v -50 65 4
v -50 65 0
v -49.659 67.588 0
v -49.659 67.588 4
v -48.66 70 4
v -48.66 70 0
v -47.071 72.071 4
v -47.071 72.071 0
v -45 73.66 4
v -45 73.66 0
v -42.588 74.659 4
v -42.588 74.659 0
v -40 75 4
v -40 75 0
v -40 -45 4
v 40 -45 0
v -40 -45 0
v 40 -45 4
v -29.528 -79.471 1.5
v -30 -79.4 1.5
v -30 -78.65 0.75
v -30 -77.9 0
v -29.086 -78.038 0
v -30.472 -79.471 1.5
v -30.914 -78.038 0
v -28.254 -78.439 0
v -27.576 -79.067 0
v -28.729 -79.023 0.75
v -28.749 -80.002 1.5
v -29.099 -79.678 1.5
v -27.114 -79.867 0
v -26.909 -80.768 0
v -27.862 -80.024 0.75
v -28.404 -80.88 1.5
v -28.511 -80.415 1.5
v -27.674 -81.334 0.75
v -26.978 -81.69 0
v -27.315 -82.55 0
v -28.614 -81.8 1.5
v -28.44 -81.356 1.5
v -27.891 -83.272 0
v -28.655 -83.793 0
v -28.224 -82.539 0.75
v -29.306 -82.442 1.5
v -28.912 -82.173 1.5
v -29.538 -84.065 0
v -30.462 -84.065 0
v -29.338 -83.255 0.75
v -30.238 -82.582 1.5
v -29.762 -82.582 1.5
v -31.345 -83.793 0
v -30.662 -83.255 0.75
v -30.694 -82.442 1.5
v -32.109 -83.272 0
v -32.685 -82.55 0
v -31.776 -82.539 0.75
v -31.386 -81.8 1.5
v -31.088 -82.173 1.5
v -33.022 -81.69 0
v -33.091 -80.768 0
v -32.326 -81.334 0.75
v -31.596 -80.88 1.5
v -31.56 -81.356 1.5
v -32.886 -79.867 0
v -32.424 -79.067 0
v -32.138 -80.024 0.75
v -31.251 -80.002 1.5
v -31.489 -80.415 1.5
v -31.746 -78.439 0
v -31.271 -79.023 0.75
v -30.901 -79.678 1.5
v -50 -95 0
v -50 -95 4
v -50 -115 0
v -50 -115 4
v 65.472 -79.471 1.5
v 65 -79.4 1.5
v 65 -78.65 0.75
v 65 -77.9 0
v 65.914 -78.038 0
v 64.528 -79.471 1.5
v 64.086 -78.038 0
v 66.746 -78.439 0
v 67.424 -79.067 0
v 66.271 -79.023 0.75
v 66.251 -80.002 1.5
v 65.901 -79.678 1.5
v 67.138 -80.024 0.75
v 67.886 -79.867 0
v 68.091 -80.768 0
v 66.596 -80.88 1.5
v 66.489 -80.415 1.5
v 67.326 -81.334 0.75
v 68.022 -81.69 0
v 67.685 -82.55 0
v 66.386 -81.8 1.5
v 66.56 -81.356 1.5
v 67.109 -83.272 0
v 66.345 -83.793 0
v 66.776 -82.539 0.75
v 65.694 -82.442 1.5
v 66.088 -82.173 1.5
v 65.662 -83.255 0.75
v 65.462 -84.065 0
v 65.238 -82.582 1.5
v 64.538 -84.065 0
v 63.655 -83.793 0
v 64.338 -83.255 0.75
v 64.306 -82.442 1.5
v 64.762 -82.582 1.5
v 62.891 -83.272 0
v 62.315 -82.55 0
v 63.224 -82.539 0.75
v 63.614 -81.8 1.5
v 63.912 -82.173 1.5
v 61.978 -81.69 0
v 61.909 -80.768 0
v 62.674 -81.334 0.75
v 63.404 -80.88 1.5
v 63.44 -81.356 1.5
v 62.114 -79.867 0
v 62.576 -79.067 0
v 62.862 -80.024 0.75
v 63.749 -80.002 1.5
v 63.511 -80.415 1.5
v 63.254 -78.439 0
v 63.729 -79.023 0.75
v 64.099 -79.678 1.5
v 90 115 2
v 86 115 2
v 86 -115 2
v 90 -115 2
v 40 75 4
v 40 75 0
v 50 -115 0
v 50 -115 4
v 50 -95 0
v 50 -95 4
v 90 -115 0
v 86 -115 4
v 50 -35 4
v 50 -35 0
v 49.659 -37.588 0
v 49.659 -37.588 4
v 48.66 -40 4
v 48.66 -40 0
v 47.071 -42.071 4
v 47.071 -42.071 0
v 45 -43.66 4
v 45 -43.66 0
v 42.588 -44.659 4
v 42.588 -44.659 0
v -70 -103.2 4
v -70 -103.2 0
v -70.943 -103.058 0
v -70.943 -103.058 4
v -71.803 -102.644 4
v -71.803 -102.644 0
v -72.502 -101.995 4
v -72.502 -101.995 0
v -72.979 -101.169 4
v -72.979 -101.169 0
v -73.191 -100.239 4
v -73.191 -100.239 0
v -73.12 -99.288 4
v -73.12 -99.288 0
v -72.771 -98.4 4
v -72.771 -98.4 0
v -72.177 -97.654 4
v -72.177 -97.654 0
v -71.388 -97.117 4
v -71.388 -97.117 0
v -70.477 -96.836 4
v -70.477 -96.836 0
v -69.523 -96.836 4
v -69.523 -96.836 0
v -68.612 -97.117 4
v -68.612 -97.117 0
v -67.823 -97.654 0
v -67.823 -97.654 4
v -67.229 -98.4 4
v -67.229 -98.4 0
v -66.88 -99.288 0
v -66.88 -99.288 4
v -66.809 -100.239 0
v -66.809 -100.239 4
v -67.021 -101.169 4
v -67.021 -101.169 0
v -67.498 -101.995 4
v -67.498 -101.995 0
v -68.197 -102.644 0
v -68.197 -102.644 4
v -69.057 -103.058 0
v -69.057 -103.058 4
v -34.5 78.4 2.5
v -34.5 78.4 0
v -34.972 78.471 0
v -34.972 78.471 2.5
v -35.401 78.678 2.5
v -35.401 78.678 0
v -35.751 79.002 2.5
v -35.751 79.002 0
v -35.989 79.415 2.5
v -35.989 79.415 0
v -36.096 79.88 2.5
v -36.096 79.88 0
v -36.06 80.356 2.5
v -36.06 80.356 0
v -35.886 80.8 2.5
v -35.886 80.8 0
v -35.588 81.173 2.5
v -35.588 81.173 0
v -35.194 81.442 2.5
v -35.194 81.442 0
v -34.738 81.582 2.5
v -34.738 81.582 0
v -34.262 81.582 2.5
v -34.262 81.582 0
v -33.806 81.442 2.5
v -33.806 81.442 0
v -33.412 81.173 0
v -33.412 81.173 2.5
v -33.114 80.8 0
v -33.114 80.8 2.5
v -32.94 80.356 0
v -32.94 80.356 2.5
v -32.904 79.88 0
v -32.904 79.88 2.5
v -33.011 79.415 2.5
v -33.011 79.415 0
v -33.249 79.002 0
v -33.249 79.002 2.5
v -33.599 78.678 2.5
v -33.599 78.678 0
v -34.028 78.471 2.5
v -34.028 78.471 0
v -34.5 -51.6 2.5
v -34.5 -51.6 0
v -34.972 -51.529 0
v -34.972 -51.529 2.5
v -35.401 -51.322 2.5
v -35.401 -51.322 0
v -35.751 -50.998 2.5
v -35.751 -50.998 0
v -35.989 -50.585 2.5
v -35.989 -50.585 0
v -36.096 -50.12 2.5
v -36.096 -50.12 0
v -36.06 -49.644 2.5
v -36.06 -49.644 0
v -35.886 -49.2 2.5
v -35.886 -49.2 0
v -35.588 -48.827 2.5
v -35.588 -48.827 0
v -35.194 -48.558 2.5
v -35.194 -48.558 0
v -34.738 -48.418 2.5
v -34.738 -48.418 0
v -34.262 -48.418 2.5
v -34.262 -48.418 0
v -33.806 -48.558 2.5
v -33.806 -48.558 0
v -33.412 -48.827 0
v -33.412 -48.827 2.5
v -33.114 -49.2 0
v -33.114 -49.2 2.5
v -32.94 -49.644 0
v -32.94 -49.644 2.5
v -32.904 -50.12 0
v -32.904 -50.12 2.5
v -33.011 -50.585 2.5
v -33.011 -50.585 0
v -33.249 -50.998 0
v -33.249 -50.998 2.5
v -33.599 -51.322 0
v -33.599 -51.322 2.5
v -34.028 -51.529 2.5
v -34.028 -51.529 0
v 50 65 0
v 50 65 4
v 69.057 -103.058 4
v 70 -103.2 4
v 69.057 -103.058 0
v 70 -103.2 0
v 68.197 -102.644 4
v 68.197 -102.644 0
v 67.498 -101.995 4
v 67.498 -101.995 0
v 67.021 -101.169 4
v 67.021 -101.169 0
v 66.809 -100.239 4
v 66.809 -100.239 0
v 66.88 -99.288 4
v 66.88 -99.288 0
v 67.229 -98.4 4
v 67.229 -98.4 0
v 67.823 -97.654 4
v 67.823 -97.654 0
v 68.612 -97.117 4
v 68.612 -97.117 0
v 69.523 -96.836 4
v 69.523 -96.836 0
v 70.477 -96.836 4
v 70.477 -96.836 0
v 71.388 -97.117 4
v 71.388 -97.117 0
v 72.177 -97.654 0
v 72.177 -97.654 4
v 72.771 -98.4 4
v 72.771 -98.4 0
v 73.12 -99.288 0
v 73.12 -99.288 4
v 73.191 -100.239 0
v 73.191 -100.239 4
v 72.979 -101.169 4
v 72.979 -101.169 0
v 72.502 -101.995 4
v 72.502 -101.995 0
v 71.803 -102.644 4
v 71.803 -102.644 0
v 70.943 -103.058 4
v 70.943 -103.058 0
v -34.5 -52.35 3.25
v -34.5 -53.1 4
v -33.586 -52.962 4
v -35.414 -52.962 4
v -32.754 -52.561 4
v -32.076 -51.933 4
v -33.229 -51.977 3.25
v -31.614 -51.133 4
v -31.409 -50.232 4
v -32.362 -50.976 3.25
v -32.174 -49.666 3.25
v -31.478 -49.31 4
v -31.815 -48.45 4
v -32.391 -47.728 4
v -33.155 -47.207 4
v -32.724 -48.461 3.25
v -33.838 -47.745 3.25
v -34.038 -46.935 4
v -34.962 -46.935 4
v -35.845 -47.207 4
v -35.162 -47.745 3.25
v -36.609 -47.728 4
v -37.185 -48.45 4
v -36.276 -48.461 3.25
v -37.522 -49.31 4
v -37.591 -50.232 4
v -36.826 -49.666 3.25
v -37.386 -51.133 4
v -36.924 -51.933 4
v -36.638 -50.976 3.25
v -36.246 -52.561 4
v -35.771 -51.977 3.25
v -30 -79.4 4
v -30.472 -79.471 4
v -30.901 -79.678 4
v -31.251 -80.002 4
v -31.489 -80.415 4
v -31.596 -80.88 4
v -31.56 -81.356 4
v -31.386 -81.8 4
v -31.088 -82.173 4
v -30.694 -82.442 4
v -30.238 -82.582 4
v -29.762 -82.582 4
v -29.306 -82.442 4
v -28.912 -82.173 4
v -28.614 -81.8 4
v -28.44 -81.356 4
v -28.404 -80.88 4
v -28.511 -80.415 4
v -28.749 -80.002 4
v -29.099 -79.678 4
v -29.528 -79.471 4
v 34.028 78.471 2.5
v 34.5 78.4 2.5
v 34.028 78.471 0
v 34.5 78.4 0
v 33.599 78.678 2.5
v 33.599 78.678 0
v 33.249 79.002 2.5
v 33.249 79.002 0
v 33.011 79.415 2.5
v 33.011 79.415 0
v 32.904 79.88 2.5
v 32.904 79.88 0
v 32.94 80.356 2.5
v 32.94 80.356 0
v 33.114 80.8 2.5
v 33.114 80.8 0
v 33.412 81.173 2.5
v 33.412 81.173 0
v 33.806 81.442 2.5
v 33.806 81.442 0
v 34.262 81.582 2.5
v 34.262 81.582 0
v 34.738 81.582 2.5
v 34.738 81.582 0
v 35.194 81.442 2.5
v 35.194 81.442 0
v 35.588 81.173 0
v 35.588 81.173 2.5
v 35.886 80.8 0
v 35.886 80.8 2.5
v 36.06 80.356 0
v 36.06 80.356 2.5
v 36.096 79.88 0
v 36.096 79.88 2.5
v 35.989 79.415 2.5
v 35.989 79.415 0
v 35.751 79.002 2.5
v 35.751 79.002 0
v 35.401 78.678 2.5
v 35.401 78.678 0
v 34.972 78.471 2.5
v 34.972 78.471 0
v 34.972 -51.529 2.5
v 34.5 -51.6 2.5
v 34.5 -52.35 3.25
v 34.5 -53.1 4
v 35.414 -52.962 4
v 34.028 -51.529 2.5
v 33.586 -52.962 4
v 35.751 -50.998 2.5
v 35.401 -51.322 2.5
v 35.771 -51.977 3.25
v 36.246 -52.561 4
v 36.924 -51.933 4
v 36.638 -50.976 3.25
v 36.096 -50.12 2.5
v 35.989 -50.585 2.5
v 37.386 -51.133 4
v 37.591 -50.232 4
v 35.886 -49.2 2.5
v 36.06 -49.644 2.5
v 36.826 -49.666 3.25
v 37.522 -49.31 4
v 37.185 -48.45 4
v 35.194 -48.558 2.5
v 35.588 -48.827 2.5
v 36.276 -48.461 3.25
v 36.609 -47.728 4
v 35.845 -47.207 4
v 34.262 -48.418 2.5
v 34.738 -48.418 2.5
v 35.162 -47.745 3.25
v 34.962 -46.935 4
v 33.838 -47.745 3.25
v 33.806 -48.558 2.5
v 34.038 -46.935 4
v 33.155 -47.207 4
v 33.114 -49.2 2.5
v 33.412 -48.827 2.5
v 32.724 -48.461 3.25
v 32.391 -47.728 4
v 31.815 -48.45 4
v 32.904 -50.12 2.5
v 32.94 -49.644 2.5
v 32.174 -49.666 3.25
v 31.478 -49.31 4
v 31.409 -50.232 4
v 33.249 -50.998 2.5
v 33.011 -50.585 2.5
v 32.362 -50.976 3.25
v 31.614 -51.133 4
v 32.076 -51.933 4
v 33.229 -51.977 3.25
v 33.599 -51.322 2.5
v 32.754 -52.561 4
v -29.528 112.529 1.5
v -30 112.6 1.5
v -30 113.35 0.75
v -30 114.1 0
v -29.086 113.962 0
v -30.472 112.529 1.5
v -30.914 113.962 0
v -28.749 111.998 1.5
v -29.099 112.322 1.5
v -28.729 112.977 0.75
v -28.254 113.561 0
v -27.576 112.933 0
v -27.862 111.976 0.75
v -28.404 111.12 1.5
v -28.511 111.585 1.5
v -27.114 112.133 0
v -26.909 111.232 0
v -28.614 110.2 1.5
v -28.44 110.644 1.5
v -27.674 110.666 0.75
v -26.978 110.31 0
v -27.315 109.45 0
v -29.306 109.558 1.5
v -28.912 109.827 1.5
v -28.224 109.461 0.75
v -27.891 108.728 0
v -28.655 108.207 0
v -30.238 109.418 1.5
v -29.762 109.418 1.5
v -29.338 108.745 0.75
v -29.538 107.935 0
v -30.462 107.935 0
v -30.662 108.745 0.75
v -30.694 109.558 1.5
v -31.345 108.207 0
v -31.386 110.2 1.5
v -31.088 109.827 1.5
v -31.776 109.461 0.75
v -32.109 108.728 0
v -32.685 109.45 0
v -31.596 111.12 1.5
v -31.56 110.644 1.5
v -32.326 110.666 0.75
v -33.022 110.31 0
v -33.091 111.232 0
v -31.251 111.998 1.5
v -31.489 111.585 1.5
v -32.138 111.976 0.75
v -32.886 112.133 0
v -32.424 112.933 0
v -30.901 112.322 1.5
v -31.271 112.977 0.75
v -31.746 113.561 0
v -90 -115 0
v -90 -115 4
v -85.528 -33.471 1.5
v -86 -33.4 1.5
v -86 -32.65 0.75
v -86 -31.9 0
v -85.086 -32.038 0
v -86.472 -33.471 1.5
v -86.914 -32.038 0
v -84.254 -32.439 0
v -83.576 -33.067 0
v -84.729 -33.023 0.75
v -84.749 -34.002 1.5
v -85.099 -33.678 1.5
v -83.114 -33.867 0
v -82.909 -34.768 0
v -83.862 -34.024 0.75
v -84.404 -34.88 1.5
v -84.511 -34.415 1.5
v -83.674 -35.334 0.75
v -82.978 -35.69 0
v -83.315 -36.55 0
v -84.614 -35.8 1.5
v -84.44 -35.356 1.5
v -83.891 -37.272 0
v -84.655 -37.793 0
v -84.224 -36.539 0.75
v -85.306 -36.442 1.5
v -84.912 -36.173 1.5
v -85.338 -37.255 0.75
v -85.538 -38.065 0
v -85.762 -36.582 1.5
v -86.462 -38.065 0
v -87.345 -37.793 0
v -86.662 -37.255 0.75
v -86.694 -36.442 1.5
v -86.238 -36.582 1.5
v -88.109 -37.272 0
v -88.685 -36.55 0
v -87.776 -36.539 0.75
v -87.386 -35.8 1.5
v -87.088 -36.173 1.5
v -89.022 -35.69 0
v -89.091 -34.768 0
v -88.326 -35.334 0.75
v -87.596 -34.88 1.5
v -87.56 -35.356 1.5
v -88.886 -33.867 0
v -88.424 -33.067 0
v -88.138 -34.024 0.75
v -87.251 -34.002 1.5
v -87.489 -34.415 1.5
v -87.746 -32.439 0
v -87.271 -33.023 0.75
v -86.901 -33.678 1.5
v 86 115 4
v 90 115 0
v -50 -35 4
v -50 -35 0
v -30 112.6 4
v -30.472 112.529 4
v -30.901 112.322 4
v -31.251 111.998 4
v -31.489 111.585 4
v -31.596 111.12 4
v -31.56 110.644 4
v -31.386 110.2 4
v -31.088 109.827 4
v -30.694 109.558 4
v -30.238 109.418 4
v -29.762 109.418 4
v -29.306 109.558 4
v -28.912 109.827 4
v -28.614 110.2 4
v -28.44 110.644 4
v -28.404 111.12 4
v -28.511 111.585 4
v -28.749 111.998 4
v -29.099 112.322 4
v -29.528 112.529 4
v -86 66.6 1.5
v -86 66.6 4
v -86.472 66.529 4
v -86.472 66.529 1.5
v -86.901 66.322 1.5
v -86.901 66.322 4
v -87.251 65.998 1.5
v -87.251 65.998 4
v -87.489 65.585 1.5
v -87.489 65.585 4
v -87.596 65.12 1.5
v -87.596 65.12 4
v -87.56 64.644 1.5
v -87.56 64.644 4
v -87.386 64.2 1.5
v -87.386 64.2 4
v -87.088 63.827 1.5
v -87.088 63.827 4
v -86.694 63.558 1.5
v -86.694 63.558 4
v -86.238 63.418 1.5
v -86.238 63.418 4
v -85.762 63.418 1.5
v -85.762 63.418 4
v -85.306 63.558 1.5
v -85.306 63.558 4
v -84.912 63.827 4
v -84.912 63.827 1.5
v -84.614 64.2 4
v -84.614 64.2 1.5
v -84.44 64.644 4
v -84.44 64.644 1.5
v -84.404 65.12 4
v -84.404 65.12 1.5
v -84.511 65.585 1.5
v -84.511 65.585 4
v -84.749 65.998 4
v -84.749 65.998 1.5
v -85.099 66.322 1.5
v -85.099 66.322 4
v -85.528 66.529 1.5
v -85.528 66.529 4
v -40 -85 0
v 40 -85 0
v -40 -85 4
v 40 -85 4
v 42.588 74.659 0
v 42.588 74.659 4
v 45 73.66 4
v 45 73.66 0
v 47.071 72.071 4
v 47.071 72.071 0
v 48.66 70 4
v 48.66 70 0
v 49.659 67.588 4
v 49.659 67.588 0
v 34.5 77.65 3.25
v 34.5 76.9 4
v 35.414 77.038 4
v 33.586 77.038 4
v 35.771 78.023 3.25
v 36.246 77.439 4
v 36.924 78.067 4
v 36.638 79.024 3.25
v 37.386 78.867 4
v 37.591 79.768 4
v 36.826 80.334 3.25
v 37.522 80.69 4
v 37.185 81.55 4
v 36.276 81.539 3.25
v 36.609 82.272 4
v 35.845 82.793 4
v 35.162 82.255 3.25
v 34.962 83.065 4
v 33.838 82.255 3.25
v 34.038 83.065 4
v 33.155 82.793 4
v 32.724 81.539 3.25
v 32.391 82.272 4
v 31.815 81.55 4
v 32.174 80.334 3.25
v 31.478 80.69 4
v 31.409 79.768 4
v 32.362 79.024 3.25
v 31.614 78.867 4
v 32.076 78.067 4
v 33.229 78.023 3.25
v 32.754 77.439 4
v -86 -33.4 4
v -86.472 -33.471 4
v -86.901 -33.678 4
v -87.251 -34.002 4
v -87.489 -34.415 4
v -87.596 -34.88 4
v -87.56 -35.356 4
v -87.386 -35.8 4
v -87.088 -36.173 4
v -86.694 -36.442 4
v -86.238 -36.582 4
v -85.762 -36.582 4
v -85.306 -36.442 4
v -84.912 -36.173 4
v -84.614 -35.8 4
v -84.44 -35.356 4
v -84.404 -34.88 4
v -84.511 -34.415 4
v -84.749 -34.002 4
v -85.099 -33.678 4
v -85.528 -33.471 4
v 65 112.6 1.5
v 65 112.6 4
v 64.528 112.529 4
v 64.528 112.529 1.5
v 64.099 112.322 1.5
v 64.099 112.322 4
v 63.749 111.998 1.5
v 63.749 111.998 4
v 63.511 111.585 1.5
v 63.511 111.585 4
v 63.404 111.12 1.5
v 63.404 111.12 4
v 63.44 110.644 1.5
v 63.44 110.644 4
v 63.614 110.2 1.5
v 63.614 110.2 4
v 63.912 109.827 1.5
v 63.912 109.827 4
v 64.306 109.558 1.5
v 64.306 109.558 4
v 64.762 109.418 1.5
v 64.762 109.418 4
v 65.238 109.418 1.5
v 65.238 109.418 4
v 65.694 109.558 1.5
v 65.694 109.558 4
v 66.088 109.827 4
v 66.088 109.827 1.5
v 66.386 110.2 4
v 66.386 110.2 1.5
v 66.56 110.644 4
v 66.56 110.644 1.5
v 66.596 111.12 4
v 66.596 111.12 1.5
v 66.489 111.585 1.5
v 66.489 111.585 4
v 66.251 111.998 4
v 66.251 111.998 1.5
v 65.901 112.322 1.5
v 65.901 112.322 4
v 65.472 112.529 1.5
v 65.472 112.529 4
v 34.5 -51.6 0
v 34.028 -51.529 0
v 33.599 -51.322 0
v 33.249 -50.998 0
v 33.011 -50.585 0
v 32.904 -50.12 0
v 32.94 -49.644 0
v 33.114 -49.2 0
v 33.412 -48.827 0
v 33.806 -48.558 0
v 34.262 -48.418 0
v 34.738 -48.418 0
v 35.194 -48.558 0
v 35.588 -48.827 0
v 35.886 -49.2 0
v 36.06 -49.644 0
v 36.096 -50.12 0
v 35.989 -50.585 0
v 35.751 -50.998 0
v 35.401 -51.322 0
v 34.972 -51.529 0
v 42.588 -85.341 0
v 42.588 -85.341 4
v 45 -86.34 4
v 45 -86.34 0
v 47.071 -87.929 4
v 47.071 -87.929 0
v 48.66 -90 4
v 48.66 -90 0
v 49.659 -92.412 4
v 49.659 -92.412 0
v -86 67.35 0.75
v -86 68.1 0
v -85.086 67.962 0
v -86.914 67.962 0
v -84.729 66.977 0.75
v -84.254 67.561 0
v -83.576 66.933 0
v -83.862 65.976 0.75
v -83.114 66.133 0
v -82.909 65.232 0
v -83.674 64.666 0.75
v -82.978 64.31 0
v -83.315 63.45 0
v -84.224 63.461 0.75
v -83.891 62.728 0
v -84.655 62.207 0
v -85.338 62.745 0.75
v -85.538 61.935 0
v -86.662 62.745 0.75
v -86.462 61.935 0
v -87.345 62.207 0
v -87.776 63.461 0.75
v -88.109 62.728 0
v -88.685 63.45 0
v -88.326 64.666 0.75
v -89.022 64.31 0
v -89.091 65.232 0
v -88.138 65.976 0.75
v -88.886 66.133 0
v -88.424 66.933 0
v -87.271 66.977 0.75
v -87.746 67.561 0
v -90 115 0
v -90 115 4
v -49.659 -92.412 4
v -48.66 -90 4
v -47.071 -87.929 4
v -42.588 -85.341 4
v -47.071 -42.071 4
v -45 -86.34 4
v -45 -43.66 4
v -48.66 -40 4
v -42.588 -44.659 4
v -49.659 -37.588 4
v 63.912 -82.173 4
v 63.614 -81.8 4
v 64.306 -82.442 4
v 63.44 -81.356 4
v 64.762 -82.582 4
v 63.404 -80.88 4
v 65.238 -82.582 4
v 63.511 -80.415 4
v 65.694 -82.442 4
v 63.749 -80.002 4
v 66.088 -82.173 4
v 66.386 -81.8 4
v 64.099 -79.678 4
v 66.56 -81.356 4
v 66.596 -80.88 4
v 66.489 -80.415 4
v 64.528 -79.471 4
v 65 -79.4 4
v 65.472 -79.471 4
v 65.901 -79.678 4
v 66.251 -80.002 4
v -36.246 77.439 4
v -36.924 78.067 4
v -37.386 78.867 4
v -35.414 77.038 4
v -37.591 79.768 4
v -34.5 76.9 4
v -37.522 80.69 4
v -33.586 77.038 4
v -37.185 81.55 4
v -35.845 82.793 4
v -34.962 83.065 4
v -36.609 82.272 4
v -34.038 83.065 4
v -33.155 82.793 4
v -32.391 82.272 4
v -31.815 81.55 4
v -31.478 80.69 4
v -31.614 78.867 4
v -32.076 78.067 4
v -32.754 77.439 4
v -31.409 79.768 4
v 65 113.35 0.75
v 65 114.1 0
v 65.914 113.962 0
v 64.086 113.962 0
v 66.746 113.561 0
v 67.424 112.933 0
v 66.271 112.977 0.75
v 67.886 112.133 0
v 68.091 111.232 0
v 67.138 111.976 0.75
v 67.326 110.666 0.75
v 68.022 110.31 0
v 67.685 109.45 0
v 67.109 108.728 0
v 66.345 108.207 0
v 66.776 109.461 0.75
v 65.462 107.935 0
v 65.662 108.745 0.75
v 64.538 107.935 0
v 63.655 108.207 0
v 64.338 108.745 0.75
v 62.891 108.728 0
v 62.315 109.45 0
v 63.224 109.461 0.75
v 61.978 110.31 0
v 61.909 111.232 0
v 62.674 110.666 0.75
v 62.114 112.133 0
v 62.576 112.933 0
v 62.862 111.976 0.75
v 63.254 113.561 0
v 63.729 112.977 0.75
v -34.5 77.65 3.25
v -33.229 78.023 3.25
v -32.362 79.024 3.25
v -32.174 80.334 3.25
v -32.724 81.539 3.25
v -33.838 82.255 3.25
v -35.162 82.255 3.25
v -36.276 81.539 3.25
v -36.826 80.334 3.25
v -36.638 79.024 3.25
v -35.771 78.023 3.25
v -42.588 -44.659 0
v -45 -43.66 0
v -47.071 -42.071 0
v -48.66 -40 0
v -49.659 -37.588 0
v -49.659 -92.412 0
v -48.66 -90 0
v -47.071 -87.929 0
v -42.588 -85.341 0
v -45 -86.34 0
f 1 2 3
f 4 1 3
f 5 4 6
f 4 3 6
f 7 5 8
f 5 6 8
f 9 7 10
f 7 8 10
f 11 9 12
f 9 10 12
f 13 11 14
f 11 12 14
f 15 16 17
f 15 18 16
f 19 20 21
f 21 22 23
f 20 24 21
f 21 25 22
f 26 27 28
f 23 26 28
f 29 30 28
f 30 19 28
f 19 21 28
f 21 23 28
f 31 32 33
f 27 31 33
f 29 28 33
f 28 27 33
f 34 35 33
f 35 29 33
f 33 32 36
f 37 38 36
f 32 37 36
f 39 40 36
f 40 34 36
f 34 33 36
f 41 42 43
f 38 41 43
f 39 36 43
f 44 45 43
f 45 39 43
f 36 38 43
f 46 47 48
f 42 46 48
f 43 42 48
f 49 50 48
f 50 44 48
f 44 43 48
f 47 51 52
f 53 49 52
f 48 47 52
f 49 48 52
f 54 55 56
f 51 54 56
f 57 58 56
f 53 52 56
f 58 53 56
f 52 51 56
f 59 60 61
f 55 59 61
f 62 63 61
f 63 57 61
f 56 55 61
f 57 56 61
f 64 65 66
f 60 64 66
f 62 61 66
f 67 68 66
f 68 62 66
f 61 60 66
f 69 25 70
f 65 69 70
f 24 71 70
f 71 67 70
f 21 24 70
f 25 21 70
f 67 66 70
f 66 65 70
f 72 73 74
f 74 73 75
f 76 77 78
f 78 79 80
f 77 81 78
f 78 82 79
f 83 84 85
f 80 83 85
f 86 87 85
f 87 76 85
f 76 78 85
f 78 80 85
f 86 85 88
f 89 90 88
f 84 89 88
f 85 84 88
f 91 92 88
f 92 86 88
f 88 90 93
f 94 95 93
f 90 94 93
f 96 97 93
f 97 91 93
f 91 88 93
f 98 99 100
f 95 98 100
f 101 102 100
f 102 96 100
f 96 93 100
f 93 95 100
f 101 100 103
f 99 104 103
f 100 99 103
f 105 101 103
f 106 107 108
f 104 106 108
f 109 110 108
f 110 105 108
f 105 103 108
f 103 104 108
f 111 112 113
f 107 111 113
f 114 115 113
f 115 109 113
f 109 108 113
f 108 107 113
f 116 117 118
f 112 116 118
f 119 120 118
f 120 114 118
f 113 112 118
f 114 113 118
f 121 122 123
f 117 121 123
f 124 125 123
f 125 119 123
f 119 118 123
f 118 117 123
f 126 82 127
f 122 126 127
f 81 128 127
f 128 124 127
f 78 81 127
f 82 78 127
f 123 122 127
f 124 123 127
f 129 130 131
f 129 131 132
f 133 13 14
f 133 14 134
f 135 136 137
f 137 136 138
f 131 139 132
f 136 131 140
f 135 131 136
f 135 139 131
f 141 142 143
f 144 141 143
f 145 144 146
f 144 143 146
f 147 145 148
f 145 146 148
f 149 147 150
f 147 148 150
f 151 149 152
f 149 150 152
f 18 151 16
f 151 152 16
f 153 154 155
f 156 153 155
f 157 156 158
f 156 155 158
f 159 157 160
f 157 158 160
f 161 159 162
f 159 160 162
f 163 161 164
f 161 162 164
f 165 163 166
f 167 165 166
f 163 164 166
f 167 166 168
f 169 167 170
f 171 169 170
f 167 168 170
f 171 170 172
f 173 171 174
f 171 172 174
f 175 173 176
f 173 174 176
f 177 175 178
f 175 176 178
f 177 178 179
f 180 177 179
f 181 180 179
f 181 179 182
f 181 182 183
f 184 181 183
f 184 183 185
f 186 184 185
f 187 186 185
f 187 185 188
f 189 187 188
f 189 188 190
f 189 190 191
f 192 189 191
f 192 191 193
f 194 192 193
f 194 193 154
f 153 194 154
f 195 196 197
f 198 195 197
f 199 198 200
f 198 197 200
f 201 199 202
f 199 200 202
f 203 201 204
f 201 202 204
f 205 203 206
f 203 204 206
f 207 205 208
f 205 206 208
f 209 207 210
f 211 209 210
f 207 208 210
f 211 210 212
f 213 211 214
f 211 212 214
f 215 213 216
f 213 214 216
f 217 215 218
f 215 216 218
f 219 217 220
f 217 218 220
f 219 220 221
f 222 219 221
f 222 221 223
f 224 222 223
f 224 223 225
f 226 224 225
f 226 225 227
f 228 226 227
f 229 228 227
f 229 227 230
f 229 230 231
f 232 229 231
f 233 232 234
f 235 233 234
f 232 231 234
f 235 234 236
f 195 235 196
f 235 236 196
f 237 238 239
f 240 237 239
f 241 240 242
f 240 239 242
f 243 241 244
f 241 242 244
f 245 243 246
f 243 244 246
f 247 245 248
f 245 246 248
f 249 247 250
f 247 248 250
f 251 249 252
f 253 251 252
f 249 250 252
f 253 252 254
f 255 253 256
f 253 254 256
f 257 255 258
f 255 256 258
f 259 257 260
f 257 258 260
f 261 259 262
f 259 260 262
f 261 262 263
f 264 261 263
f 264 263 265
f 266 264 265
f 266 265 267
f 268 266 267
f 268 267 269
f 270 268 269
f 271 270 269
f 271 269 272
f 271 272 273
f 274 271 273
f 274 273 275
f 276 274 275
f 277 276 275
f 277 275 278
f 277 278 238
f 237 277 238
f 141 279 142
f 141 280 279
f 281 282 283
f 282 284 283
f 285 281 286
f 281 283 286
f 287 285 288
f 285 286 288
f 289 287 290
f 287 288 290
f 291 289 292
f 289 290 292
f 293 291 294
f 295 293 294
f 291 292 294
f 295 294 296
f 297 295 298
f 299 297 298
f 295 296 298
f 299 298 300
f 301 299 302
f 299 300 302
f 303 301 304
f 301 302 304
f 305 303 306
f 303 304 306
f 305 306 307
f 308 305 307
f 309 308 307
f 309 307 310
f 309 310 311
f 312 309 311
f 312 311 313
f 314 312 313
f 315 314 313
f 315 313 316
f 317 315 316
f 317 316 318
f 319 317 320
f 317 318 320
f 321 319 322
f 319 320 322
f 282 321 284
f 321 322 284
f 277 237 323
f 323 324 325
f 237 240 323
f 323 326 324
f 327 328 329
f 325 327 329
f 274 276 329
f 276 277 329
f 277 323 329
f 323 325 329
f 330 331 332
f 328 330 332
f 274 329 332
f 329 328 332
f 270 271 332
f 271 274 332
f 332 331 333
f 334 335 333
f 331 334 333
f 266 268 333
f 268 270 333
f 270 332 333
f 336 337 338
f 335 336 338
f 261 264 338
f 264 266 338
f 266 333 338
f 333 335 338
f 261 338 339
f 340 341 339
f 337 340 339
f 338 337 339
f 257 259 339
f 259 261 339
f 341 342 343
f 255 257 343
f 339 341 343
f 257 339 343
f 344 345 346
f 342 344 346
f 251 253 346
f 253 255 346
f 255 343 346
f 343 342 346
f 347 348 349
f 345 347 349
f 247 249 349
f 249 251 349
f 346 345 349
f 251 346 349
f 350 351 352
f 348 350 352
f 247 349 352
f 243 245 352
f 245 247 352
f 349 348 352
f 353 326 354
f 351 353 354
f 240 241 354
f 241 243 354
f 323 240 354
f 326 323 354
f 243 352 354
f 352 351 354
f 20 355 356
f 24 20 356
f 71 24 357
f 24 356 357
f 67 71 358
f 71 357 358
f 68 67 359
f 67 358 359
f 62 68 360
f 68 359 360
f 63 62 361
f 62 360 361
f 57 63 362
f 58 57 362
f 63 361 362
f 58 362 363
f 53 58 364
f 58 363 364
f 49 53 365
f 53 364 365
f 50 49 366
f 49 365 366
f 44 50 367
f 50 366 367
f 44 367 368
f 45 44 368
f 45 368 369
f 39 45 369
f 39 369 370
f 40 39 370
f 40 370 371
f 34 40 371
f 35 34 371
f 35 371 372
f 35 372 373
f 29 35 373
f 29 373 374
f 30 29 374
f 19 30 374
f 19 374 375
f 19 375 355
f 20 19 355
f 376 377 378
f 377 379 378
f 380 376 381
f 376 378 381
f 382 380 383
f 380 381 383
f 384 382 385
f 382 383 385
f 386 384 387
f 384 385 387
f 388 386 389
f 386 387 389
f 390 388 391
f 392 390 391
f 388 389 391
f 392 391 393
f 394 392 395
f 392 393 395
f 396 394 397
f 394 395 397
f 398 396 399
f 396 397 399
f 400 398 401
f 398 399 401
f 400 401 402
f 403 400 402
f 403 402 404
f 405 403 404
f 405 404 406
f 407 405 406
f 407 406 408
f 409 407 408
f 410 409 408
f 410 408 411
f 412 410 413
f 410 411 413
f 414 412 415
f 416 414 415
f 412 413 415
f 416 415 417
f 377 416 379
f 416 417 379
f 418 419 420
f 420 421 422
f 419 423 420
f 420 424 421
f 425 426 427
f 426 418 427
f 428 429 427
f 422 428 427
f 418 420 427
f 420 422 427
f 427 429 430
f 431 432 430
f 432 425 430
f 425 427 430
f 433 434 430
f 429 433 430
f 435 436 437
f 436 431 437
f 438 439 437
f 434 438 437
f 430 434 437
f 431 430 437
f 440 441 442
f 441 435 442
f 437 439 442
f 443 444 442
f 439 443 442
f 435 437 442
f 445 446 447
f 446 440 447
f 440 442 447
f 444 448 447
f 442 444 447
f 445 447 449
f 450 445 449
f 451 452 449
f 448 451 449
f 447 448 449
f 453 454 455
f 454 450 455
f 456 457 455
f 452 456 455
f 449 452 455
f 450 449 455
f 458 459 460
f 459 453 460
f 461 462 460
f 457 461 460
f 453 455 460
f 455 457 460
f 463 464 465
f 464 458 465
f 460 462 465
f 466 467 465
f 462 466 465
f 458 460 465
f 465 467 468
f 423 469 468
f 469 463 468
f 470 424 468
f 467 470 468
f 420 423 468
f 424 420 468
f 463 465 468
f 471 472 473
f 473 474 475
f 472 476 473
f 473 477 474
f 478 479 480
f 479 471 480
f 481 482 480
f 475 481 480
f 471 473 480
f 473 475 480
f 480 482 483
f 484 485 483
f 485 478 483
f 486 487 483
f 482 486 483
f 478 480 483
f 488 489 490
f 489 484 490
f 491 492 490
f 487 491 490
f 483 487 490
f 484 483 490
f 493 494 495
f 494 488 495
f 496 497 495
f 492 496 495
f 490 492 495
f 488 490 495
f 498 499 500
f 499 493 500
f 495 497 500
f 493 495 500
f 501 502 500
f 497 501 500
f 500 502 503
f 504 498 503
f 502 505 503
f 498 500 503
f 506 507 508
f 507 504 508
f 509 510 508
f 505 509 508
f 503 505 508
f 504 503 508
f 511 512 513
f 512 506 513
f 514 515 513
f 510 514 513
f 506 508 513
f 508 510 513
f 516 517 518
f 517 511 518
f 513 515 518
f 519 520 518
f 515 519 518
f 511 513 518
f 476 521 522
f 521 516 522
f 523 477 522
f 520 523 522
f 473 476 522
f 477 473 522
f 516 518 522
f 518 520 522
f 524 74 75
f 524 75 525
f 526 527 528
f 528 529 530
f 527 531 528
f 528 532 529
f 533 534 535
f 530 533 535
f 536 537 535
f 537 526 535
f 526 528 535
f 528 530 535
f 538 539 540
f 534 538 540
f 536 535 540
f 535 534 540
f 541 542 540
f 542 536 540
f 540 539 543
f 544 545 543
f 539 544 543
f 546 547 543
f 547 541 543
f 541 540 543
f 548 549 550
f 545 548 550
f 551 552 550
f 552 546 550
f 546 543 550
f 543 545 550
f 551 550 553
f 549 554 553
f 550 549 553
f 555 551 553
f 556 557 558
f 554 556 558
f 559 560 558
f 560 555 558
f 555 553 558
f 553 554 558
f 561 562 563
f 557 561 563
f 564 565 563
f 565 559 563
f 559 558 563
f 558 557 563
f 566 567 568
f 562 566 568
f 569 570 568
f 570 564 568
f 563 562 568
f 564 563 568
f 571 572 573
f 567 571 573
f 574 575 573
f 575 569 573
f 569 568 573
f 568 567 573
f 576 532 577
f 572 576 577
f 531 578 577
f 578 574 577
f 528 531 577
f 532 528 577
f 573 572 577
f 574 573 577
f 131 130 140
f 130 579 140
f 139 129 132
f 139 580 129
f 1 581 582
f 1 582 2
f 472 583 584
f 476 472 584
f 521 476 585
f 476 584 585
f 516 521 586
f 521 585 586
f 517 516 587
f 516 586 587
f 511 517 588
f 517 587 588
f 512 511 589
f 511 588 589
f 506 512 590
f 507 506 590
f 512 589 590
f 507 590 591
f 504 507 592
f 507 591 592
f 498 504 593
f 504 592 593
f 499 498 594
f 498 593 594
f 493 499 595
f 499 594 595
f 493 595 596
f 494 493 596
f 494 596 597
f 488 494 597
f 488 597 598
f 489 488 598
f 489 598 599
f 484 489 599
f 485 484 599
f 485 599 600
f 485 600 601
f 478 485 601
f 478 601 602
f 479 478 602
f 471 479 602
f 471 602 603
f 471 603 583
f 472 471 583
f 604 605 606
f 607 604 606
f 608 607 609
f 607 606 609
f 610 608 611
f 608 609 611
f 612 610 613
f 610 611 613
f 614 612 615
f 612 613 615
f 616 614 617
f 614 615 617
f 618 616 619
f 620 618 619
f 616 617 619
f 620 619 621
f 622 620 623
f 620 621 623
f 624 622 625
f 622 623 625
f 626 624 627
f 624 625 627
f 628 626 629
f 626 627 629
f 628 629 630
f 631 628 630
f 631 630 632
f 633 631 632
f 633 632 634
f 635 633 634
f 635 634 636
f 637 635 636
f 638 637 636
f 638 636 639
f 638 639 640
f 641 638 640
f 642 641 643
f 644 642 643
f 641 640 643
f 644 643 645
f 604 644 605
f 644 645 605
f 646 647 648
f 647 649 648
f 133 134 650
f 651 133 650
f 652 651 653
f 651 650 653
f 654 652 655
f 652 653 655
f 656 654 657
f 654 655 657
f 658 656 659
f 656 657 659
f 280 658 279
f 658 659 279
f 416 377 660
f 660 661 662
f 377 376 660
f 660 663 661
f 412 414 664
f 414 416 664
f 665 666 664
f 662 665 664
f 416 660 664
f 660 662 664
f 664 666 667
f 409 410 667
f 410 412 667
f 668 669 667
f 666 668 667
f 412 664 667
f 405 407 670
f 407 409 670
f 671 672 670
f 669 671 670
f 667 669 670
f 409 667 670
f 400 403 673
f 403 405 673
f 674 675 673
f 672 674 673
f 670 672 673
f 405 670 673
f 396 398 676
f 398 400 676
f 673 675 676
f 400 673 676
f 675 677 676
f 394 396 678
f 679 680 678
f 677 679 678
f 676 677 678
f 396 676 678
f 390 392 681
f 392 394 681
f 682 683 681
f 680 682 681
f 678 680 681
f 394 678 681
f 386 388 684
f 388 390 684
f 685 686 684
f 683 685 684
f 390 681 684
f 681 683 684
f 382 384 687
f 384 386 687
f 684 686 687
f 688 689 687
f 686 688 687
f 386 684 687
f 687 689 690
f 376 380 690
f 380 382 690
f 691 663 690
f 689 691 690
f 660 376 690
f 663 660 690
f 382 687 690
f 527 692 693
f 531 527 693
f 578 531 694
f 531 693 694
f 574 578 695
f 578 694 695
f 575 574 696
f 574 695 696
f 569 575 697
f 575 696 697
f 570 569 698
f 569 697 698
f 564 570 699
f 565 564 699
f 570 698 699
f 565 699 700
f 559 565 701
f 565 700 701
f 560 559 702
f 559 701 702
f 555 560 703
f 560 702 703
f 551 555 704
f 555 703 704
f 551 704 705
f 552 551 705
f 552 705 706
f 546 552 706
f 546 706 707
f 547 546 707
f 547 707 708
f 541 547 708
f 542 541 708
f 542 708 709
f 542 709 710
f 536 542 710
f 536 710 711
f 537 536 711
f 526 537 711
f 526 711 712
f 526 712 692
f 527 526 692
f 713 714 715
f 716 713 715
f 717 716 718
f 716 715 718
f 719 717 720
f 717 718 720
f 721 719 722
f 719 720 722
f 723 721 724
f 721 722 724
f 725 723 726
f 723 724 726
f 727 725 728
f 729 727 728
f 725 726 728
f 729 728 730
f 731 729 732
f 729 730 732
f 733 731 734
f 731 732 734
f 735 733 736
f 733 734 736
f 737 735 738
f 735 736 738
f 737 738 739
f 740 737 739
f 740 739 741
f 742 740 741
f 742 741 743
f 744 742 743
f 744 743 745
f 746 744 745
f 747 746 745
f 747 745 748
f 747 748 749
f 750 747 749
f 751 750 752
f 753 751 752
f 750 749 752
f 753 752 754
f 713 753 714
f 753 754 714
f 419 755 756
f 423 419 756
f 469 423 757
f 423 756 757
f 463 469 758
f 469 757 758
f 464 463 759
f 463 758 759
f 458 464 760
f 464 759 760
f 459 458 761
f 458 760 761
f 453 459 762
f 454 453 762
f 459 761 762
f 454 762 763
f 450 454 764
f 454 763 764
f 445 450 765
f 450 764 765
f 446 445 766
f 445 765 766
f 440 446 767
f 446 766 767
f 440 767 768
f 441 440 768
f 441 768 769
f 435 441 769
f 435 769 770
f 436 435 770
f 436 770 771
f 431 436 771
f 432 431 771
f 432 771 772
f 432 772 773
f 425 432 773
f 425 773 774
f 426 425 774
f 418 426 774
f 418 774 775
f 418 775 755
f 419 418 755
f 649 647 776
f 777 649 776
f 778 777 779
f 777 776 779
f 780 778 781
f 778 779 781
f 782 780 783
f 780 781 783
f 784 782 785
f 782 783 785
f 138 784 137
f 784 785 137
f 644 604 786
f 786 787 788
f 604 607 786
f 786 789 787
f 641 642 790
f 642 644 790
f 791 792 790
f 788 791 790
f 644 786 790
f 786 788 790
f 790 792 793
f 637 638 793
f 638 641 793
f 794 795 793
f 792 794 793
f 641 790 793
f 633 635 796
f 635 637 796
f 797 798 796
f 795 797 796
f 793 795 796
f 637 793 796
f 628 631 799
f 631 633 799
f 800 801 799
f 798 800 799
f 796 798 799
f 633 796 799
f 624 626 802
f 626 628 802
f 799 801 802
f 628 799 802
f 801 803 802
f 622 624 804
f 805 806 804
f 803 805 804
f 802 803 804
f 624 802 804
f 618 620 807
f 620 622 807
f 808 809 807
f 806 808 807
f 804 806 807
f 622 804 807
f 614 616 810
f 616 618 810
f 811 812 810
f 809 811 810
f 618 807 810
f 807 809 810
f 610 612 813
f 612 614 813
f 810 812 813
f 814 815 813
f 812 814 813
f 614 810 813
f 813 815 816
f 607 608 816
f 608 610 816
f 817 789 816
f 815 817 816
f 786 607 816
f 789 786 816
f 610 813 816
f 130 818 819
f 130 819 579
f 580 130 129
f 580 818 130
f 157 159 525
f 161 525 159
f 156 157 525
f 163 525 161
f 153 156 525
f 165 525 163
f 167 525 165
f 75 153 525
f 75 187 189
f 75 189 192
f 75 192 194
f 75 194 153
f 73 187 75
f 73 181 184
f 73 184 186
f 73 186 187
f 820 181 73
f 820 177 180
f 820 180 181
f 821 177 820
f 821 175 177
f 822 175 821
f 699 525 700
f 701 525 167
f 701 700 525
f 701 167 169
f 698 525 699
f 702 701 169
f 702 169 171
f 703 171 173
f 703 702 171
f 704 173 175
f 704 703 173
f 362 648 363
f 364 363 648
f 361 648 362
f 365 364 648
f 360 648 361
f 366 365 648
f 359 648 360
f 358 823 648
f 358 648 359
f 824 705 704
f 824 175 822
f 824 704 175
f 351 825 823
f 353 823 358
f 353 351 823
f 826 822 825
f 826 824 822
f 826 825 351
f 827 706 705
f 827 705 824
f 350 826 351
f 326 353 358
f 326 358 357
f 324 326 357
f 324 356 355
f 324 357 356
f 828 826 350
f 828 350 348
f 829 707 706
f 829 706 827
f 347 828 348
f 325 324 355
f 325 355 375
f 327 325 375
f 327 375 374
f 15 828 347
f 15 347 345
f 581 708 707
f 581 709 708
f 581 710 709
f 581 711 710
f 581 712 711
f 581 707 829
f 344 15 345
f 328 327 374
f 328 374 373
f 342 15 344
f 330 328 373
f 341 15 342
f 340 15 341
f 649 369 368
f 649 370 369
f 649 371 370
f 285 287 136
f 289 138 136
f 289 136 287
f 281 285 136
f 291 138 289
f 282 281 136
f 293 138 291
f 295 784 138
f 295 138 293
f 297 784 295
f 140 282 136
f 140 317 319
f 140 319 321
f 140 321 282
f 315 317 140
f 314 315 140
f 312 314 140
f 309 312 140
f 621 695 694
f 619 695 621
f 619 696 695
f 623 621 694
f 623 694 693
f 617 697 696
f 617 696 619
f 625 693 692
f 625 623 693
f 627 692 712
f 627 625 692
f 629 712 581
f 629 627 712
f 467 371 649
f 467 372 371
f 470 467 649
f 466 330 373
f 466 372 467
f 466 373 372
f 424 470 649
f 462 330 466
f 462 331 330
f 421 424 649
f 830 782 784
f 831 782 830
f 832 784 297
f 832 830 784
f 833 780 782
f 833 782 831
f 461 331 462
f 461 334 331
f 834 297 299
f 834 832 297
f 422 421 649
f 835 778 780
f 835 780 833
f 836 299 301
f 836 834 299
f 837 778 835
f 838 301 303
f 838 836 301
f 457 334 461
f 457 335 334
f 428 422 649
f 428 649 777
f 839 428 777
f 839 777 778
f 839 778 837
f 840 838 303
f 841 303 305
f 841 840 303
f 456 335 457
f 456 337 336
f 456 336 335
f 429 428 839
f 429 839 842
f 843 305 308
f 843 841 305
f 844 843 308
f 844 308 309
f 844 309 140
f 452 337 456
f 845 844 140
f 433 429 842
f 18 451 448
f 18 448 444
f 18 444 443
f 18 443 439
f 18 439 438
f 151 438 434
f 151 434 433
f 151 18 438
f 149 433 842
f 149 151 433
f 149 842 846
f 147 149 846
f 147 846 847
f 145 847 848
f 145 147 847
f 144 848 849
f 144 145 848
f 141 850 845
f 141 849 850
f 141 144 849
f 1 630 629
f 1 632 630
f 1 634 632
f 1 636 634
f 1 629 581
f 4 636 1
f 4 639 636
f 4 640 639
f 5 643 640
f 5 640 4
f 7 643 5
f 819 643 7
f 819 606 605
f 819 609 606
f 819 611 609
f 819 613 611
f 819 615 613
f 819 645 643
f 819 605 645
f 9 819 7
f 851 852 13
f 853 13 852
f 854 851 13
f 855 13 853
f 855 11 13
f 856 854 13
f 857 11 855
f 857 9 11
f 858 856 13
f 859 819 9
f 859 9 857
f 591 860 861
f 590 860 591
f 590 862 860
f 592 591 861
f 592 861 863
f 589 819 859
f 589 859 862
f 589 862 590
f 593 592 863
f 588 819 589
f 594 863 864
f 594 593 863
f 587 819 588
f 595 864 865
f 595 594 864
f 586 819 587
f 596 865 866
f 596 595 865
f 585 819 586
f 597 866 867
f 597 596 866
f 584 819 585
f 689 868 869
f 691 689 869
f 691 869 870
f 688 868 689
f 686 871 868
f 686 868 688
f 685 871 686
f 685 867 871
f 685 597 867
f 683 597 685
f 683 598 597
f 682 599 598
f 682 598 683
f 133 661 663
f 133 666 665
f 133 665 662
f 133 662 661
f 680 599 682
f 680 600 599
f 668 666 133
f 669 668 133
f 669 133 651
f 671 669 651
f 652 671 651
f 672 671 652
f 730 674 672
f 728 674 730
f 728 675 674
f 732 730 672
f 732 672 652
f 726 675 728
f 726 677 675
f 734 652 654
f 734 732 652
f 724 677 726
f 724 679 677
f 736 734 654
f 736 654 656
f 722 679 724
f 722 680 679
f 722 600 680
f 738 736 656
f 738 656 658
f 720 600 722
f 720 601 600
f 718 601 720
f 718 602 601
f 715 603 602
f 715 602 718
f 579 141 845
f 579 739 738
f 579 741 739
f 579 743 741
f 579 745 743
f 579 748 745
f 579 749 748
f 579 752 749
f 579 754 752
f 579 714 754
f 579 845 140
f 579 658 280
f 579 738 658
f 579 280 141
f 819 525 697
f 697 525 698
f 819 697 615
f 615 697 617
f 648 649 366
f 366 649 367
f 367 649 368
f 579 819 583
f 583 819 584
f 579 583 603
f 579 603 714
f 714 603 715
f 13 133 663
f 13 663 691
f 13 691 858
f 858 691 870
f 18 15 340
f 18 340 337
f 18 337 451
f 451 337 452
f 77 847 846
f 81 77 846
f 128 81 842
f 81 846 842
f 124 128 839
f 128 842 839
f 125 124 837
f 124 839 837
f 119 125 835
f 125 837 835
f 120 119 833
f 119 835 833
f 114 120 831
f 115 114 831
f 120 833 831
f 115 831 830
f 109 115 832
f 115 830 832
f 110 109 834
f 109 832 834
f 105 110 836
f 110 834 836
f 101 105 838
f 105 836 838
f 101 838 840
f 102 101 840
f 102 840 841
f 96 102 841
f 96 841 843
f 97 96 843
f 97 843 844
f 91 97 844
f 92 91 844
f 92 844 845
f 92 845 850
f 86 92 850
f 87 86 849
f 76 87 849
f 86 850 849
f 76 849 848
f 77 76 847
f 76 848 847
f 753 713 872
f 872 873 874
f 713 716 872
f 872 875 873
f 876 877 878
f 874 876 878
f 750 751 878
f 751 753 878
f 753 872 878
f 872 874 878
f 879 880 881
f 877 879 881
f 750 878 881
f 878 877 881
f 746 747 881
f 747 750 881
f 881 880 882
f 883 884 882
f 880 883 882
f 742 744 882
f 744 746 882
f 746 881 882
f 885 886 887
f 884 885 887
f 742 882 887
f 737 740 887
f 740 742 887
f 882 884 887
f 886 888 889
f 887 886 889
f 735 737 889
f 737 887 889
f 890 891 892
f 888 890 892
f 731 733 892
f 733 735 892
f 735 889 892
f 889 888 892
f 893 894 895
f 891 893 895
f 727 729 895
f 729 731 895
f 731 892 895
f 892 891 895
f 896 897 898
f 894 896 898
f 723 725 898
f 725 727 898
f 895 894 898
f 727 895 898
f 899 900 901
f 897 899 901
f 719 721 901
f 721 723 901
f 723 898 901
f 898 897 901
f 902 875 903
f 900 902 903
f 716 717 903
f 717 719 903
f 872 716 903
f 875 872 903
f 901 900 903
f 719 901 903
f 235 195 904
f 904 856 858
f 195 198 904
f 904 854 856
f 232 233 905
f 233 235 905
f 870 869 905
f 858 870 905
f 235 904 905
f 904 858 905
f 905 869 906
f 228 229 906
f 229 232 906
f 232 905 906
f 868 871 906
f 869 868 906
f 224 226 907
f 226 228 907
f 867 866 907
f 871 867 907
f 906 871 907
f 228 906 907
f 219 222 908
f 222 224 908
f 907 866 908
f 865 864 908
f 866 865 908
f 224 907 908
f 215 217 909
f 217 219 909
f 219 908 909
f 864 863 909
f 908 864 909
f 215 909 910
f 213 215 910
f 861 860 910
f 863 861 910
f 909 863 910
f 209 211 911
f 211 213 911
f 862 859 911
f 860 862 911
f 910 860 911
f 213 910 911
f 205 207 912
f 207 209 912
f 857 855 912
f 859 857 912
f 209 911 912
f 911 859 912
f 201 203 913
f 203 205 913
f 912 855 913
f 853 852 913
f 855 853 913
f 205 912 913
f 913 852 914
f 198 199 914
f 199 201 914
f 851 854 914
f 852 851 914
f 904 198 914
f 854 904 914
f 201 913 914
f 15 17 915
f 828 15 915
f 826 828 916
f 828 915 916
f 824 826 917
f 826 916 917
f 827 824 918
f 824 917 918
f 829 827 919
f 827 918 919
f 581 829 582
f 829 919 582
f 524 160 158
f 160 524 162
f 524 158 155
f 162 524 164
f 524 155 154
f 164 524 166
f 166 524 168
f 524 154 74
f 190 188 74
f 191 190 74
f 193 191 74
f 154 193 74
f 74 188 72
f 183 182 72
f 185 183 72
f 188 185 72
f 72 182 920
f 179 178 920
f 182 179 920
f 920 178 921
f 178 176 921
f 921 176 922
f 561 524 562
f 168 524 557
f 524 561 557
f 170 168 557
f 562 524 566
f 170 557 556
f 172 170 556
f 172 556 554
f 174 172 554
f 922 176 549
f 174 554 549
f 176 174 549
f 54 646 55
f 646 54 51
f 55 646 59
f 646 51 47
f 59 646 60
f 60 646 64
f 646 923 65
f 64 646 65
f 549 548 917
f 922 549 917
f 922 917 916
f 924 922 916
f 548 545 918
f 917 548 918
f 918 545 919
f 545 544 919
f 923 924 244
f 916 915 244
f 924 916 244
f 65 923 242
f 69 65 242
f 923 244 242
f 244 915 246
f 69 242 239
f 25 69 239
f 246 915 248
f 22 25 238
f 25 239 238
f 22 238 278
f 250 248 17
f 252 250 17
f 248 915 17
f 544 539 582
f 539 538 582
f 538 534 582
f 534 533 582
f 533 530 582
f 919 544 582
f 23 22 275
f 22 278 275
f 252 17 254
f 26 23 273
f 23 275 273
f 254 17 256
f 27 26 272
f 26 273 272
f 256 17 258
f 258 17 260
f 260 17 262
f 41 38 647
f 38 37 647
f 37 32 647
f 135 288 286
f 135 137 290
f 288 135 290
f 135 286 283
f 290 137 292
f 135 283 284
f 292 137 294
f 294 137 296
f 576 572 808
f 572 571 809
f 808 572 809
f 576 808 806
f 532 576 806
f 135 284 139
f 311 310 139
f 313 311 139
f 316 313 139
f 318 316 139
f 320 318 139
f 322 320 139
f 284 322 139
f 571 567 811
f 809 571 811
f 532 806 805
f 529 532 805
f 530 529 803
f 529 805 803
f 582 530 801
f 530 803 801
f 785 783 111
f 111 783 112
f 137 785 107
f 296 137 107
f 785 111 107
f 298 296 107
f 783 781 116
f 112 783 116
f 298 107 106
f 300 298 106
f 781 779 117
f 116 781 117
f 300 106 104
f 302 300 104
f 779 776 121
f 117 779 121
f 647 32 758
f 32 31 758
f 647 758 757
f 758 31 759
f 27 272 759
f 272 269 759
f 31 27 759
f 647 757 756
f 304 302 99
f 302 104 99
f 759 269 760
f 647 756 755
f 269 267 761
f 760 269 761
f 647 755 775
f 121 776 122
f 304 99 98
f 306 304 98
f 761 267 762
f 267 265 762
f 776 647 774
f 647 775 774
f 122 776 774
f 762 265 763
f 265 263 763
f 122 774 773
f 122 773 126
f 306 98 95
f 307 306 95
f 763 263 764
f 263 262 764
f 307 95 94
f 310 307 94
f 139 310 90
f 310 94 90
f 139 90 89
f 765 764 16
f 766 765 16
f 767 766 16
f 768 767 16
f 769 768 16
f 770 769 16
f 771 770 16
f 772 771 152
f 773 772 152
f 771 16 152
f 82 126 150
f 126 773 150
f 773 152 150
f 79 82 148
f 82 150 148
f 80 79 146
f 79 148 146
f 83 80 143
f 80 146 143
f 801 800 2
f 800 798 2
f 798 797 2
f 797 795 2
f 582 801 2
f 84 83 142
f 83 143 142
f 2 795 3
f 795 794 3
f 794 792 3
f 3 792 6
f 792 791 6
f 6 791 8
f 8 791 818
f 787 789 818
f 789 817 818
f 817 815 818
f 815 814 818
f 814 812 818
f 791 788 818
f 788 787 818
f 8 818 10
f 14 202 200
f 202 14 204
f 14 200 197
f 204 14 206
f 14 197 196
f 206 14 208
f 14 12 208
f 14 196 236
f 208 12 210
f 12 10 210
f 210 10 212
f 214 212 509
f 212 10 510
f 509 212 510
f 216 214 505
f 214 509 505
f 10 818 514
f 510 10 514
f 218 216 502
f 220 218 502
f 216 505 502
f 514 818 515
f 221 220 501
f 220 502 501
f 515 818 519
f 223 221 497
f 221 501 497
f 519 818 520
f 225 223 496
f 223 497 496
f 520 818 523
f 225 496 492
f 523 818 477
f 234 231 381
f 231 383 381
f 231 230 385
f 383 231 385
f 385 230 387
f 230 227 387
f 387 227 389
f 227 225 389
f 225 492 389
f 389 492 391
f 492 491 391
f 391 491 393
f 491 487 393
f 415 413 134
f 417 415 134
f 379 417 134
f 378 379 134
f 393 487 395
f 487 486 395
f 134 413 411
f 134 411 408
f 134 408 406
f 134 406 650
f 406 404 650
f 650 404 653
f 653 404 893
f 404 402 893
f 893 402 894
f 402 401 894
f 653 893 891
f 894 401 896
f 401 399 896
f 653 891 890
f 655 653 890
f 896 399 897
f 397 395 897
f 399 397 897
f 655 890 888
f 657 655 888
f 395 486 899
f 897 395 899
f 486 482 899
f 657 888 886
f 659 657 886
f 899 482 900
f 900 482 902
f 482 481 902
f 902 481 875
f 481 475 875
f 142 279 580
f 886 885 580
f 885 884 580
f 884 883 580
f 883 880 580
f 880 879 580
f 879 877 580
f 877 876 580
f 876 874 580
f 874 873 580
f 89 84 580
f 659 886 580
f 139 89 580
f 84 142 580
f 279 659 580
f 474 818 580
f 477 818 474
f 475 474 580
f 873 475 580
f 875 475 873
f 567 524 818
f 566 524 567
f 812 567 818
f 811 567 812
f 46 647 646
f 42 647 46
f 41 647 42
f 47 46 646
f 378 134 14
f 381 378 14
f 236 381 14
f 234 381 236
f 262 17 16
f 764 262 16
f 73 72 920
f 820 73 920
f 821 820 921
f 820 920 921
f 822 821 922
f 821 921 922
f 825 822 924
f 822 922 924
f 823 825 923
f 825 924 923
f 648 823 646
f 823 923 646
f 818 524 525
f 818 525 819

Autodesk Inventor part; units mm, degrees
ref_plane "YZ Plane" through (0, 0, 0) normal (1, 0, 0) x (0, 1, 0)
ref_plane "XZ Plane" through (0, 0, 0) normal (0, 1, 0) x (-1, 0, 0)
ref_plane "XY Plane" through (0, 0, 0) normal (0, 0, 1) x (1, 0, 0)
sketch "Skizze1" plane through (0, 0, 0) normal (0, 0, 1) x (1, 0, 0)
  line L0 (0, 161) -> (0, -161) projected
  line L1 (-126, 0) -> (126, 0) projected
  line L2 (-90, 115) -> (90, 115)
  line L3 (90, 115) -> (90, -115)
  line L4 (90, -115) -> (-90, -115)
  line L5 (-90, -115) -> (-90, 115)
  point P0 (0, 0)
  point P1 (0, 115)
  point P2 (-90, 0)
  dimension "d0" = 230
  dimension "d1" = 180
extrude "Extrusion1" add sketch "Skizze1" along normal blind 4
sketch "Skizze2" plane through (0, 0, 4) normal (0, 0, 1) x (1, 0, 0)
  line L0 (-90, -115) -> (-90, 115) projected
  line L1 (90, -115) -> (-90, -115) projected
  line L2 (90, 115) -> (90, -115) projected
  point P0 (0, 0)
  point P1 (-70, -100)
  point P2 (70, -100)
  dimension "d4" = 20
  dimension "d5" = 20
  dimension "d6" = 15
  dimension "d7" = 15
hole "Bohrung1" at (-70, -100, 4) at (70, -100, 4) direction (0, 0, -1) diameter 6.4 end through all
sketch "Skizze3" plane through (0, 0, 4) normal (0, 0, 1) x (1, 0, 0)
  line L0 (90, -115) -> (-90, -115) projected
  line L1 (90, 115) -> (90, -115) projected
  line L2 (90, 115) -> (86, 115)
  line L3 (86, 115) -> (86, -115)
  line L4 (86, -115) -> (90, -115)
  line L5 (90, -115) -> (90, 115)
  point P0 (0, 0)
  dimension "d15" = 4
extrude "Extrusion2" cut sketch "Skizze3" against normal blind 2
sketch "Skizze4" plane through (0, 0, 4) normal (0, 0, 1) x (1, 0, 0)
  line L0 (-90, 115) -> (86, 115) projected
  line L1 (-90, -115) -> (-90, 115) projected
  line L2 (-50, 75) -> (50, 75)
  line L3 (50, 75) -> (50, -45)
  line L4 (50, -45) -> (-50, -45)
  line L5 (-50, -45) -> (-50, 75)
  point P0 (0, 0)
  dimension "d18" = 100
  dimension "d19" = 120
  dimension "d20" = 40
  dimension "d21" = 40
extrude "Extrusion3" cut sketch "Skizze4" against normal through all
fillet "Rundung1" radius 10 4 edges at (-50, 75, 2) (50, 75, 2) (50, -45, 2) (-50, -45, 2)
sketch "Skizze5" plane through (0, 0, 4) normal (0, 0, 1) x (1, 0, 0)
  line L0 (-90, -115) -> (-90, 115) projected
  line L1 (86, -115) -> (-90, -115) projected
  line L2 (-50, -115) -> (50, -115)
  line L3 (50, -115) -> (50, -85)
  line L4 (50, -85) -> (-50, -85)
  line L5 (-50, -85) -> (-50, -115)
  point P0 (0, 0)
  dimension "d25" = 100
  dimension "d26" = 30
  dimension "d27" = 40
extrude "Extrusion4" cut sketch "Skizze5" against normal through all
fillet "Rundung2" radius 10 2 edges at (-50, -85, 2) (50, -85, 2)
sketch "Skizze6" plane through (0, 0, 0) normal (0, 0, -1) x (-1, 0, 0)
  line L0 (90, -115) -> (50, -115) projected
  line L1 (90, 115) -> (90, -115) projected
  line L2 (-90, 115) -> (90, 115) projected
  line L3 (-90, -115) -> (-90, 115) projected
  line L4 (-40, -85) -> (40, -85) projected
  point P0 (0, 0)
  point P1 (-65, 111)
  point P2 (30, 111)
  point P3 (86, 65)
  point P4 (86, -35)
  point P5 (30, -81)
  point P6 (-65, -81)
  dimension "d31" = 60
  dimension "d32" = 4
  dimension "d33" = 25
  dimension "d34" = 50
  dimension "d35" = 4
  dimension "d36" = 4
  dimension "d37" = 80
  dimension "d38" = 4
  dimension "d39" = 60
  dimension "d40" = 4
  dimension "d41" = 25
  dimension "d42" = 4
hole "Bohrung2" at (65, 111, 0) at (-30, 111, 0) at (-86, 65, 0) at (-86, -35, 0) at (-30, -81, 0) at (65, -81, 0) direction (0, 0, 1) diameter 3.2 end through all countersink diameter 6.2 countersink angle 90
sketch "Skizze7" plane through (0, 0, 4) normal (0, 0, 1) x (1, 0, 0)
  line L0 (-49.5, 75) -> (-49.5, 85) projected
  line L1 (49.5, 85) -> (-49.5, 85) projected
  line L2 (49.5, 85) -> (49.5, 75) projected
  line L3 (49.5, 75) -> (-49.5, 75) projected
  circle A0 centre (-34.5, 80) radius 1.2295 projected
  circle A1 centre (34.5, 80) radius 1.2295 projected
  circle A2 centre (34.5, -50) radius 1.2295 projected
  circle A3 centre (-34.5, -50) radius 1.2295 projected
  line L4 (-49.5, -45) -> (-49.5, -55) projected
  line L5 (49.5, -55) -> (-49.5, -55) projected
  line L6 (49.5, -55) -> (49.5, -45) projected
  line L7 (49.5, -45) -> (-49.5, -45) projected
  point P0 (0, 0)
hole "Bohrung3" at (-34.5, -50, 4) at (34.5, -50, 4) at (34.5, 80, 4) at (-34.5, 80, 4) direction (0, 0, -1) diameter 3.2 end through all countersink diameter 6.2 countersink angle 90
equation "\"d5\" = d4"
equation "\"d7\" = d6"
equation "\"d35\" = d32"
equation "\"d36\" = d32"
equation "\"d38\" = d35"
equation "\"d40\" = d38"
equation "\"d41\" = d33"
equation "\"d42\" = d40"
properties part number "Boden" material "Polycarbonate, Smoke"
